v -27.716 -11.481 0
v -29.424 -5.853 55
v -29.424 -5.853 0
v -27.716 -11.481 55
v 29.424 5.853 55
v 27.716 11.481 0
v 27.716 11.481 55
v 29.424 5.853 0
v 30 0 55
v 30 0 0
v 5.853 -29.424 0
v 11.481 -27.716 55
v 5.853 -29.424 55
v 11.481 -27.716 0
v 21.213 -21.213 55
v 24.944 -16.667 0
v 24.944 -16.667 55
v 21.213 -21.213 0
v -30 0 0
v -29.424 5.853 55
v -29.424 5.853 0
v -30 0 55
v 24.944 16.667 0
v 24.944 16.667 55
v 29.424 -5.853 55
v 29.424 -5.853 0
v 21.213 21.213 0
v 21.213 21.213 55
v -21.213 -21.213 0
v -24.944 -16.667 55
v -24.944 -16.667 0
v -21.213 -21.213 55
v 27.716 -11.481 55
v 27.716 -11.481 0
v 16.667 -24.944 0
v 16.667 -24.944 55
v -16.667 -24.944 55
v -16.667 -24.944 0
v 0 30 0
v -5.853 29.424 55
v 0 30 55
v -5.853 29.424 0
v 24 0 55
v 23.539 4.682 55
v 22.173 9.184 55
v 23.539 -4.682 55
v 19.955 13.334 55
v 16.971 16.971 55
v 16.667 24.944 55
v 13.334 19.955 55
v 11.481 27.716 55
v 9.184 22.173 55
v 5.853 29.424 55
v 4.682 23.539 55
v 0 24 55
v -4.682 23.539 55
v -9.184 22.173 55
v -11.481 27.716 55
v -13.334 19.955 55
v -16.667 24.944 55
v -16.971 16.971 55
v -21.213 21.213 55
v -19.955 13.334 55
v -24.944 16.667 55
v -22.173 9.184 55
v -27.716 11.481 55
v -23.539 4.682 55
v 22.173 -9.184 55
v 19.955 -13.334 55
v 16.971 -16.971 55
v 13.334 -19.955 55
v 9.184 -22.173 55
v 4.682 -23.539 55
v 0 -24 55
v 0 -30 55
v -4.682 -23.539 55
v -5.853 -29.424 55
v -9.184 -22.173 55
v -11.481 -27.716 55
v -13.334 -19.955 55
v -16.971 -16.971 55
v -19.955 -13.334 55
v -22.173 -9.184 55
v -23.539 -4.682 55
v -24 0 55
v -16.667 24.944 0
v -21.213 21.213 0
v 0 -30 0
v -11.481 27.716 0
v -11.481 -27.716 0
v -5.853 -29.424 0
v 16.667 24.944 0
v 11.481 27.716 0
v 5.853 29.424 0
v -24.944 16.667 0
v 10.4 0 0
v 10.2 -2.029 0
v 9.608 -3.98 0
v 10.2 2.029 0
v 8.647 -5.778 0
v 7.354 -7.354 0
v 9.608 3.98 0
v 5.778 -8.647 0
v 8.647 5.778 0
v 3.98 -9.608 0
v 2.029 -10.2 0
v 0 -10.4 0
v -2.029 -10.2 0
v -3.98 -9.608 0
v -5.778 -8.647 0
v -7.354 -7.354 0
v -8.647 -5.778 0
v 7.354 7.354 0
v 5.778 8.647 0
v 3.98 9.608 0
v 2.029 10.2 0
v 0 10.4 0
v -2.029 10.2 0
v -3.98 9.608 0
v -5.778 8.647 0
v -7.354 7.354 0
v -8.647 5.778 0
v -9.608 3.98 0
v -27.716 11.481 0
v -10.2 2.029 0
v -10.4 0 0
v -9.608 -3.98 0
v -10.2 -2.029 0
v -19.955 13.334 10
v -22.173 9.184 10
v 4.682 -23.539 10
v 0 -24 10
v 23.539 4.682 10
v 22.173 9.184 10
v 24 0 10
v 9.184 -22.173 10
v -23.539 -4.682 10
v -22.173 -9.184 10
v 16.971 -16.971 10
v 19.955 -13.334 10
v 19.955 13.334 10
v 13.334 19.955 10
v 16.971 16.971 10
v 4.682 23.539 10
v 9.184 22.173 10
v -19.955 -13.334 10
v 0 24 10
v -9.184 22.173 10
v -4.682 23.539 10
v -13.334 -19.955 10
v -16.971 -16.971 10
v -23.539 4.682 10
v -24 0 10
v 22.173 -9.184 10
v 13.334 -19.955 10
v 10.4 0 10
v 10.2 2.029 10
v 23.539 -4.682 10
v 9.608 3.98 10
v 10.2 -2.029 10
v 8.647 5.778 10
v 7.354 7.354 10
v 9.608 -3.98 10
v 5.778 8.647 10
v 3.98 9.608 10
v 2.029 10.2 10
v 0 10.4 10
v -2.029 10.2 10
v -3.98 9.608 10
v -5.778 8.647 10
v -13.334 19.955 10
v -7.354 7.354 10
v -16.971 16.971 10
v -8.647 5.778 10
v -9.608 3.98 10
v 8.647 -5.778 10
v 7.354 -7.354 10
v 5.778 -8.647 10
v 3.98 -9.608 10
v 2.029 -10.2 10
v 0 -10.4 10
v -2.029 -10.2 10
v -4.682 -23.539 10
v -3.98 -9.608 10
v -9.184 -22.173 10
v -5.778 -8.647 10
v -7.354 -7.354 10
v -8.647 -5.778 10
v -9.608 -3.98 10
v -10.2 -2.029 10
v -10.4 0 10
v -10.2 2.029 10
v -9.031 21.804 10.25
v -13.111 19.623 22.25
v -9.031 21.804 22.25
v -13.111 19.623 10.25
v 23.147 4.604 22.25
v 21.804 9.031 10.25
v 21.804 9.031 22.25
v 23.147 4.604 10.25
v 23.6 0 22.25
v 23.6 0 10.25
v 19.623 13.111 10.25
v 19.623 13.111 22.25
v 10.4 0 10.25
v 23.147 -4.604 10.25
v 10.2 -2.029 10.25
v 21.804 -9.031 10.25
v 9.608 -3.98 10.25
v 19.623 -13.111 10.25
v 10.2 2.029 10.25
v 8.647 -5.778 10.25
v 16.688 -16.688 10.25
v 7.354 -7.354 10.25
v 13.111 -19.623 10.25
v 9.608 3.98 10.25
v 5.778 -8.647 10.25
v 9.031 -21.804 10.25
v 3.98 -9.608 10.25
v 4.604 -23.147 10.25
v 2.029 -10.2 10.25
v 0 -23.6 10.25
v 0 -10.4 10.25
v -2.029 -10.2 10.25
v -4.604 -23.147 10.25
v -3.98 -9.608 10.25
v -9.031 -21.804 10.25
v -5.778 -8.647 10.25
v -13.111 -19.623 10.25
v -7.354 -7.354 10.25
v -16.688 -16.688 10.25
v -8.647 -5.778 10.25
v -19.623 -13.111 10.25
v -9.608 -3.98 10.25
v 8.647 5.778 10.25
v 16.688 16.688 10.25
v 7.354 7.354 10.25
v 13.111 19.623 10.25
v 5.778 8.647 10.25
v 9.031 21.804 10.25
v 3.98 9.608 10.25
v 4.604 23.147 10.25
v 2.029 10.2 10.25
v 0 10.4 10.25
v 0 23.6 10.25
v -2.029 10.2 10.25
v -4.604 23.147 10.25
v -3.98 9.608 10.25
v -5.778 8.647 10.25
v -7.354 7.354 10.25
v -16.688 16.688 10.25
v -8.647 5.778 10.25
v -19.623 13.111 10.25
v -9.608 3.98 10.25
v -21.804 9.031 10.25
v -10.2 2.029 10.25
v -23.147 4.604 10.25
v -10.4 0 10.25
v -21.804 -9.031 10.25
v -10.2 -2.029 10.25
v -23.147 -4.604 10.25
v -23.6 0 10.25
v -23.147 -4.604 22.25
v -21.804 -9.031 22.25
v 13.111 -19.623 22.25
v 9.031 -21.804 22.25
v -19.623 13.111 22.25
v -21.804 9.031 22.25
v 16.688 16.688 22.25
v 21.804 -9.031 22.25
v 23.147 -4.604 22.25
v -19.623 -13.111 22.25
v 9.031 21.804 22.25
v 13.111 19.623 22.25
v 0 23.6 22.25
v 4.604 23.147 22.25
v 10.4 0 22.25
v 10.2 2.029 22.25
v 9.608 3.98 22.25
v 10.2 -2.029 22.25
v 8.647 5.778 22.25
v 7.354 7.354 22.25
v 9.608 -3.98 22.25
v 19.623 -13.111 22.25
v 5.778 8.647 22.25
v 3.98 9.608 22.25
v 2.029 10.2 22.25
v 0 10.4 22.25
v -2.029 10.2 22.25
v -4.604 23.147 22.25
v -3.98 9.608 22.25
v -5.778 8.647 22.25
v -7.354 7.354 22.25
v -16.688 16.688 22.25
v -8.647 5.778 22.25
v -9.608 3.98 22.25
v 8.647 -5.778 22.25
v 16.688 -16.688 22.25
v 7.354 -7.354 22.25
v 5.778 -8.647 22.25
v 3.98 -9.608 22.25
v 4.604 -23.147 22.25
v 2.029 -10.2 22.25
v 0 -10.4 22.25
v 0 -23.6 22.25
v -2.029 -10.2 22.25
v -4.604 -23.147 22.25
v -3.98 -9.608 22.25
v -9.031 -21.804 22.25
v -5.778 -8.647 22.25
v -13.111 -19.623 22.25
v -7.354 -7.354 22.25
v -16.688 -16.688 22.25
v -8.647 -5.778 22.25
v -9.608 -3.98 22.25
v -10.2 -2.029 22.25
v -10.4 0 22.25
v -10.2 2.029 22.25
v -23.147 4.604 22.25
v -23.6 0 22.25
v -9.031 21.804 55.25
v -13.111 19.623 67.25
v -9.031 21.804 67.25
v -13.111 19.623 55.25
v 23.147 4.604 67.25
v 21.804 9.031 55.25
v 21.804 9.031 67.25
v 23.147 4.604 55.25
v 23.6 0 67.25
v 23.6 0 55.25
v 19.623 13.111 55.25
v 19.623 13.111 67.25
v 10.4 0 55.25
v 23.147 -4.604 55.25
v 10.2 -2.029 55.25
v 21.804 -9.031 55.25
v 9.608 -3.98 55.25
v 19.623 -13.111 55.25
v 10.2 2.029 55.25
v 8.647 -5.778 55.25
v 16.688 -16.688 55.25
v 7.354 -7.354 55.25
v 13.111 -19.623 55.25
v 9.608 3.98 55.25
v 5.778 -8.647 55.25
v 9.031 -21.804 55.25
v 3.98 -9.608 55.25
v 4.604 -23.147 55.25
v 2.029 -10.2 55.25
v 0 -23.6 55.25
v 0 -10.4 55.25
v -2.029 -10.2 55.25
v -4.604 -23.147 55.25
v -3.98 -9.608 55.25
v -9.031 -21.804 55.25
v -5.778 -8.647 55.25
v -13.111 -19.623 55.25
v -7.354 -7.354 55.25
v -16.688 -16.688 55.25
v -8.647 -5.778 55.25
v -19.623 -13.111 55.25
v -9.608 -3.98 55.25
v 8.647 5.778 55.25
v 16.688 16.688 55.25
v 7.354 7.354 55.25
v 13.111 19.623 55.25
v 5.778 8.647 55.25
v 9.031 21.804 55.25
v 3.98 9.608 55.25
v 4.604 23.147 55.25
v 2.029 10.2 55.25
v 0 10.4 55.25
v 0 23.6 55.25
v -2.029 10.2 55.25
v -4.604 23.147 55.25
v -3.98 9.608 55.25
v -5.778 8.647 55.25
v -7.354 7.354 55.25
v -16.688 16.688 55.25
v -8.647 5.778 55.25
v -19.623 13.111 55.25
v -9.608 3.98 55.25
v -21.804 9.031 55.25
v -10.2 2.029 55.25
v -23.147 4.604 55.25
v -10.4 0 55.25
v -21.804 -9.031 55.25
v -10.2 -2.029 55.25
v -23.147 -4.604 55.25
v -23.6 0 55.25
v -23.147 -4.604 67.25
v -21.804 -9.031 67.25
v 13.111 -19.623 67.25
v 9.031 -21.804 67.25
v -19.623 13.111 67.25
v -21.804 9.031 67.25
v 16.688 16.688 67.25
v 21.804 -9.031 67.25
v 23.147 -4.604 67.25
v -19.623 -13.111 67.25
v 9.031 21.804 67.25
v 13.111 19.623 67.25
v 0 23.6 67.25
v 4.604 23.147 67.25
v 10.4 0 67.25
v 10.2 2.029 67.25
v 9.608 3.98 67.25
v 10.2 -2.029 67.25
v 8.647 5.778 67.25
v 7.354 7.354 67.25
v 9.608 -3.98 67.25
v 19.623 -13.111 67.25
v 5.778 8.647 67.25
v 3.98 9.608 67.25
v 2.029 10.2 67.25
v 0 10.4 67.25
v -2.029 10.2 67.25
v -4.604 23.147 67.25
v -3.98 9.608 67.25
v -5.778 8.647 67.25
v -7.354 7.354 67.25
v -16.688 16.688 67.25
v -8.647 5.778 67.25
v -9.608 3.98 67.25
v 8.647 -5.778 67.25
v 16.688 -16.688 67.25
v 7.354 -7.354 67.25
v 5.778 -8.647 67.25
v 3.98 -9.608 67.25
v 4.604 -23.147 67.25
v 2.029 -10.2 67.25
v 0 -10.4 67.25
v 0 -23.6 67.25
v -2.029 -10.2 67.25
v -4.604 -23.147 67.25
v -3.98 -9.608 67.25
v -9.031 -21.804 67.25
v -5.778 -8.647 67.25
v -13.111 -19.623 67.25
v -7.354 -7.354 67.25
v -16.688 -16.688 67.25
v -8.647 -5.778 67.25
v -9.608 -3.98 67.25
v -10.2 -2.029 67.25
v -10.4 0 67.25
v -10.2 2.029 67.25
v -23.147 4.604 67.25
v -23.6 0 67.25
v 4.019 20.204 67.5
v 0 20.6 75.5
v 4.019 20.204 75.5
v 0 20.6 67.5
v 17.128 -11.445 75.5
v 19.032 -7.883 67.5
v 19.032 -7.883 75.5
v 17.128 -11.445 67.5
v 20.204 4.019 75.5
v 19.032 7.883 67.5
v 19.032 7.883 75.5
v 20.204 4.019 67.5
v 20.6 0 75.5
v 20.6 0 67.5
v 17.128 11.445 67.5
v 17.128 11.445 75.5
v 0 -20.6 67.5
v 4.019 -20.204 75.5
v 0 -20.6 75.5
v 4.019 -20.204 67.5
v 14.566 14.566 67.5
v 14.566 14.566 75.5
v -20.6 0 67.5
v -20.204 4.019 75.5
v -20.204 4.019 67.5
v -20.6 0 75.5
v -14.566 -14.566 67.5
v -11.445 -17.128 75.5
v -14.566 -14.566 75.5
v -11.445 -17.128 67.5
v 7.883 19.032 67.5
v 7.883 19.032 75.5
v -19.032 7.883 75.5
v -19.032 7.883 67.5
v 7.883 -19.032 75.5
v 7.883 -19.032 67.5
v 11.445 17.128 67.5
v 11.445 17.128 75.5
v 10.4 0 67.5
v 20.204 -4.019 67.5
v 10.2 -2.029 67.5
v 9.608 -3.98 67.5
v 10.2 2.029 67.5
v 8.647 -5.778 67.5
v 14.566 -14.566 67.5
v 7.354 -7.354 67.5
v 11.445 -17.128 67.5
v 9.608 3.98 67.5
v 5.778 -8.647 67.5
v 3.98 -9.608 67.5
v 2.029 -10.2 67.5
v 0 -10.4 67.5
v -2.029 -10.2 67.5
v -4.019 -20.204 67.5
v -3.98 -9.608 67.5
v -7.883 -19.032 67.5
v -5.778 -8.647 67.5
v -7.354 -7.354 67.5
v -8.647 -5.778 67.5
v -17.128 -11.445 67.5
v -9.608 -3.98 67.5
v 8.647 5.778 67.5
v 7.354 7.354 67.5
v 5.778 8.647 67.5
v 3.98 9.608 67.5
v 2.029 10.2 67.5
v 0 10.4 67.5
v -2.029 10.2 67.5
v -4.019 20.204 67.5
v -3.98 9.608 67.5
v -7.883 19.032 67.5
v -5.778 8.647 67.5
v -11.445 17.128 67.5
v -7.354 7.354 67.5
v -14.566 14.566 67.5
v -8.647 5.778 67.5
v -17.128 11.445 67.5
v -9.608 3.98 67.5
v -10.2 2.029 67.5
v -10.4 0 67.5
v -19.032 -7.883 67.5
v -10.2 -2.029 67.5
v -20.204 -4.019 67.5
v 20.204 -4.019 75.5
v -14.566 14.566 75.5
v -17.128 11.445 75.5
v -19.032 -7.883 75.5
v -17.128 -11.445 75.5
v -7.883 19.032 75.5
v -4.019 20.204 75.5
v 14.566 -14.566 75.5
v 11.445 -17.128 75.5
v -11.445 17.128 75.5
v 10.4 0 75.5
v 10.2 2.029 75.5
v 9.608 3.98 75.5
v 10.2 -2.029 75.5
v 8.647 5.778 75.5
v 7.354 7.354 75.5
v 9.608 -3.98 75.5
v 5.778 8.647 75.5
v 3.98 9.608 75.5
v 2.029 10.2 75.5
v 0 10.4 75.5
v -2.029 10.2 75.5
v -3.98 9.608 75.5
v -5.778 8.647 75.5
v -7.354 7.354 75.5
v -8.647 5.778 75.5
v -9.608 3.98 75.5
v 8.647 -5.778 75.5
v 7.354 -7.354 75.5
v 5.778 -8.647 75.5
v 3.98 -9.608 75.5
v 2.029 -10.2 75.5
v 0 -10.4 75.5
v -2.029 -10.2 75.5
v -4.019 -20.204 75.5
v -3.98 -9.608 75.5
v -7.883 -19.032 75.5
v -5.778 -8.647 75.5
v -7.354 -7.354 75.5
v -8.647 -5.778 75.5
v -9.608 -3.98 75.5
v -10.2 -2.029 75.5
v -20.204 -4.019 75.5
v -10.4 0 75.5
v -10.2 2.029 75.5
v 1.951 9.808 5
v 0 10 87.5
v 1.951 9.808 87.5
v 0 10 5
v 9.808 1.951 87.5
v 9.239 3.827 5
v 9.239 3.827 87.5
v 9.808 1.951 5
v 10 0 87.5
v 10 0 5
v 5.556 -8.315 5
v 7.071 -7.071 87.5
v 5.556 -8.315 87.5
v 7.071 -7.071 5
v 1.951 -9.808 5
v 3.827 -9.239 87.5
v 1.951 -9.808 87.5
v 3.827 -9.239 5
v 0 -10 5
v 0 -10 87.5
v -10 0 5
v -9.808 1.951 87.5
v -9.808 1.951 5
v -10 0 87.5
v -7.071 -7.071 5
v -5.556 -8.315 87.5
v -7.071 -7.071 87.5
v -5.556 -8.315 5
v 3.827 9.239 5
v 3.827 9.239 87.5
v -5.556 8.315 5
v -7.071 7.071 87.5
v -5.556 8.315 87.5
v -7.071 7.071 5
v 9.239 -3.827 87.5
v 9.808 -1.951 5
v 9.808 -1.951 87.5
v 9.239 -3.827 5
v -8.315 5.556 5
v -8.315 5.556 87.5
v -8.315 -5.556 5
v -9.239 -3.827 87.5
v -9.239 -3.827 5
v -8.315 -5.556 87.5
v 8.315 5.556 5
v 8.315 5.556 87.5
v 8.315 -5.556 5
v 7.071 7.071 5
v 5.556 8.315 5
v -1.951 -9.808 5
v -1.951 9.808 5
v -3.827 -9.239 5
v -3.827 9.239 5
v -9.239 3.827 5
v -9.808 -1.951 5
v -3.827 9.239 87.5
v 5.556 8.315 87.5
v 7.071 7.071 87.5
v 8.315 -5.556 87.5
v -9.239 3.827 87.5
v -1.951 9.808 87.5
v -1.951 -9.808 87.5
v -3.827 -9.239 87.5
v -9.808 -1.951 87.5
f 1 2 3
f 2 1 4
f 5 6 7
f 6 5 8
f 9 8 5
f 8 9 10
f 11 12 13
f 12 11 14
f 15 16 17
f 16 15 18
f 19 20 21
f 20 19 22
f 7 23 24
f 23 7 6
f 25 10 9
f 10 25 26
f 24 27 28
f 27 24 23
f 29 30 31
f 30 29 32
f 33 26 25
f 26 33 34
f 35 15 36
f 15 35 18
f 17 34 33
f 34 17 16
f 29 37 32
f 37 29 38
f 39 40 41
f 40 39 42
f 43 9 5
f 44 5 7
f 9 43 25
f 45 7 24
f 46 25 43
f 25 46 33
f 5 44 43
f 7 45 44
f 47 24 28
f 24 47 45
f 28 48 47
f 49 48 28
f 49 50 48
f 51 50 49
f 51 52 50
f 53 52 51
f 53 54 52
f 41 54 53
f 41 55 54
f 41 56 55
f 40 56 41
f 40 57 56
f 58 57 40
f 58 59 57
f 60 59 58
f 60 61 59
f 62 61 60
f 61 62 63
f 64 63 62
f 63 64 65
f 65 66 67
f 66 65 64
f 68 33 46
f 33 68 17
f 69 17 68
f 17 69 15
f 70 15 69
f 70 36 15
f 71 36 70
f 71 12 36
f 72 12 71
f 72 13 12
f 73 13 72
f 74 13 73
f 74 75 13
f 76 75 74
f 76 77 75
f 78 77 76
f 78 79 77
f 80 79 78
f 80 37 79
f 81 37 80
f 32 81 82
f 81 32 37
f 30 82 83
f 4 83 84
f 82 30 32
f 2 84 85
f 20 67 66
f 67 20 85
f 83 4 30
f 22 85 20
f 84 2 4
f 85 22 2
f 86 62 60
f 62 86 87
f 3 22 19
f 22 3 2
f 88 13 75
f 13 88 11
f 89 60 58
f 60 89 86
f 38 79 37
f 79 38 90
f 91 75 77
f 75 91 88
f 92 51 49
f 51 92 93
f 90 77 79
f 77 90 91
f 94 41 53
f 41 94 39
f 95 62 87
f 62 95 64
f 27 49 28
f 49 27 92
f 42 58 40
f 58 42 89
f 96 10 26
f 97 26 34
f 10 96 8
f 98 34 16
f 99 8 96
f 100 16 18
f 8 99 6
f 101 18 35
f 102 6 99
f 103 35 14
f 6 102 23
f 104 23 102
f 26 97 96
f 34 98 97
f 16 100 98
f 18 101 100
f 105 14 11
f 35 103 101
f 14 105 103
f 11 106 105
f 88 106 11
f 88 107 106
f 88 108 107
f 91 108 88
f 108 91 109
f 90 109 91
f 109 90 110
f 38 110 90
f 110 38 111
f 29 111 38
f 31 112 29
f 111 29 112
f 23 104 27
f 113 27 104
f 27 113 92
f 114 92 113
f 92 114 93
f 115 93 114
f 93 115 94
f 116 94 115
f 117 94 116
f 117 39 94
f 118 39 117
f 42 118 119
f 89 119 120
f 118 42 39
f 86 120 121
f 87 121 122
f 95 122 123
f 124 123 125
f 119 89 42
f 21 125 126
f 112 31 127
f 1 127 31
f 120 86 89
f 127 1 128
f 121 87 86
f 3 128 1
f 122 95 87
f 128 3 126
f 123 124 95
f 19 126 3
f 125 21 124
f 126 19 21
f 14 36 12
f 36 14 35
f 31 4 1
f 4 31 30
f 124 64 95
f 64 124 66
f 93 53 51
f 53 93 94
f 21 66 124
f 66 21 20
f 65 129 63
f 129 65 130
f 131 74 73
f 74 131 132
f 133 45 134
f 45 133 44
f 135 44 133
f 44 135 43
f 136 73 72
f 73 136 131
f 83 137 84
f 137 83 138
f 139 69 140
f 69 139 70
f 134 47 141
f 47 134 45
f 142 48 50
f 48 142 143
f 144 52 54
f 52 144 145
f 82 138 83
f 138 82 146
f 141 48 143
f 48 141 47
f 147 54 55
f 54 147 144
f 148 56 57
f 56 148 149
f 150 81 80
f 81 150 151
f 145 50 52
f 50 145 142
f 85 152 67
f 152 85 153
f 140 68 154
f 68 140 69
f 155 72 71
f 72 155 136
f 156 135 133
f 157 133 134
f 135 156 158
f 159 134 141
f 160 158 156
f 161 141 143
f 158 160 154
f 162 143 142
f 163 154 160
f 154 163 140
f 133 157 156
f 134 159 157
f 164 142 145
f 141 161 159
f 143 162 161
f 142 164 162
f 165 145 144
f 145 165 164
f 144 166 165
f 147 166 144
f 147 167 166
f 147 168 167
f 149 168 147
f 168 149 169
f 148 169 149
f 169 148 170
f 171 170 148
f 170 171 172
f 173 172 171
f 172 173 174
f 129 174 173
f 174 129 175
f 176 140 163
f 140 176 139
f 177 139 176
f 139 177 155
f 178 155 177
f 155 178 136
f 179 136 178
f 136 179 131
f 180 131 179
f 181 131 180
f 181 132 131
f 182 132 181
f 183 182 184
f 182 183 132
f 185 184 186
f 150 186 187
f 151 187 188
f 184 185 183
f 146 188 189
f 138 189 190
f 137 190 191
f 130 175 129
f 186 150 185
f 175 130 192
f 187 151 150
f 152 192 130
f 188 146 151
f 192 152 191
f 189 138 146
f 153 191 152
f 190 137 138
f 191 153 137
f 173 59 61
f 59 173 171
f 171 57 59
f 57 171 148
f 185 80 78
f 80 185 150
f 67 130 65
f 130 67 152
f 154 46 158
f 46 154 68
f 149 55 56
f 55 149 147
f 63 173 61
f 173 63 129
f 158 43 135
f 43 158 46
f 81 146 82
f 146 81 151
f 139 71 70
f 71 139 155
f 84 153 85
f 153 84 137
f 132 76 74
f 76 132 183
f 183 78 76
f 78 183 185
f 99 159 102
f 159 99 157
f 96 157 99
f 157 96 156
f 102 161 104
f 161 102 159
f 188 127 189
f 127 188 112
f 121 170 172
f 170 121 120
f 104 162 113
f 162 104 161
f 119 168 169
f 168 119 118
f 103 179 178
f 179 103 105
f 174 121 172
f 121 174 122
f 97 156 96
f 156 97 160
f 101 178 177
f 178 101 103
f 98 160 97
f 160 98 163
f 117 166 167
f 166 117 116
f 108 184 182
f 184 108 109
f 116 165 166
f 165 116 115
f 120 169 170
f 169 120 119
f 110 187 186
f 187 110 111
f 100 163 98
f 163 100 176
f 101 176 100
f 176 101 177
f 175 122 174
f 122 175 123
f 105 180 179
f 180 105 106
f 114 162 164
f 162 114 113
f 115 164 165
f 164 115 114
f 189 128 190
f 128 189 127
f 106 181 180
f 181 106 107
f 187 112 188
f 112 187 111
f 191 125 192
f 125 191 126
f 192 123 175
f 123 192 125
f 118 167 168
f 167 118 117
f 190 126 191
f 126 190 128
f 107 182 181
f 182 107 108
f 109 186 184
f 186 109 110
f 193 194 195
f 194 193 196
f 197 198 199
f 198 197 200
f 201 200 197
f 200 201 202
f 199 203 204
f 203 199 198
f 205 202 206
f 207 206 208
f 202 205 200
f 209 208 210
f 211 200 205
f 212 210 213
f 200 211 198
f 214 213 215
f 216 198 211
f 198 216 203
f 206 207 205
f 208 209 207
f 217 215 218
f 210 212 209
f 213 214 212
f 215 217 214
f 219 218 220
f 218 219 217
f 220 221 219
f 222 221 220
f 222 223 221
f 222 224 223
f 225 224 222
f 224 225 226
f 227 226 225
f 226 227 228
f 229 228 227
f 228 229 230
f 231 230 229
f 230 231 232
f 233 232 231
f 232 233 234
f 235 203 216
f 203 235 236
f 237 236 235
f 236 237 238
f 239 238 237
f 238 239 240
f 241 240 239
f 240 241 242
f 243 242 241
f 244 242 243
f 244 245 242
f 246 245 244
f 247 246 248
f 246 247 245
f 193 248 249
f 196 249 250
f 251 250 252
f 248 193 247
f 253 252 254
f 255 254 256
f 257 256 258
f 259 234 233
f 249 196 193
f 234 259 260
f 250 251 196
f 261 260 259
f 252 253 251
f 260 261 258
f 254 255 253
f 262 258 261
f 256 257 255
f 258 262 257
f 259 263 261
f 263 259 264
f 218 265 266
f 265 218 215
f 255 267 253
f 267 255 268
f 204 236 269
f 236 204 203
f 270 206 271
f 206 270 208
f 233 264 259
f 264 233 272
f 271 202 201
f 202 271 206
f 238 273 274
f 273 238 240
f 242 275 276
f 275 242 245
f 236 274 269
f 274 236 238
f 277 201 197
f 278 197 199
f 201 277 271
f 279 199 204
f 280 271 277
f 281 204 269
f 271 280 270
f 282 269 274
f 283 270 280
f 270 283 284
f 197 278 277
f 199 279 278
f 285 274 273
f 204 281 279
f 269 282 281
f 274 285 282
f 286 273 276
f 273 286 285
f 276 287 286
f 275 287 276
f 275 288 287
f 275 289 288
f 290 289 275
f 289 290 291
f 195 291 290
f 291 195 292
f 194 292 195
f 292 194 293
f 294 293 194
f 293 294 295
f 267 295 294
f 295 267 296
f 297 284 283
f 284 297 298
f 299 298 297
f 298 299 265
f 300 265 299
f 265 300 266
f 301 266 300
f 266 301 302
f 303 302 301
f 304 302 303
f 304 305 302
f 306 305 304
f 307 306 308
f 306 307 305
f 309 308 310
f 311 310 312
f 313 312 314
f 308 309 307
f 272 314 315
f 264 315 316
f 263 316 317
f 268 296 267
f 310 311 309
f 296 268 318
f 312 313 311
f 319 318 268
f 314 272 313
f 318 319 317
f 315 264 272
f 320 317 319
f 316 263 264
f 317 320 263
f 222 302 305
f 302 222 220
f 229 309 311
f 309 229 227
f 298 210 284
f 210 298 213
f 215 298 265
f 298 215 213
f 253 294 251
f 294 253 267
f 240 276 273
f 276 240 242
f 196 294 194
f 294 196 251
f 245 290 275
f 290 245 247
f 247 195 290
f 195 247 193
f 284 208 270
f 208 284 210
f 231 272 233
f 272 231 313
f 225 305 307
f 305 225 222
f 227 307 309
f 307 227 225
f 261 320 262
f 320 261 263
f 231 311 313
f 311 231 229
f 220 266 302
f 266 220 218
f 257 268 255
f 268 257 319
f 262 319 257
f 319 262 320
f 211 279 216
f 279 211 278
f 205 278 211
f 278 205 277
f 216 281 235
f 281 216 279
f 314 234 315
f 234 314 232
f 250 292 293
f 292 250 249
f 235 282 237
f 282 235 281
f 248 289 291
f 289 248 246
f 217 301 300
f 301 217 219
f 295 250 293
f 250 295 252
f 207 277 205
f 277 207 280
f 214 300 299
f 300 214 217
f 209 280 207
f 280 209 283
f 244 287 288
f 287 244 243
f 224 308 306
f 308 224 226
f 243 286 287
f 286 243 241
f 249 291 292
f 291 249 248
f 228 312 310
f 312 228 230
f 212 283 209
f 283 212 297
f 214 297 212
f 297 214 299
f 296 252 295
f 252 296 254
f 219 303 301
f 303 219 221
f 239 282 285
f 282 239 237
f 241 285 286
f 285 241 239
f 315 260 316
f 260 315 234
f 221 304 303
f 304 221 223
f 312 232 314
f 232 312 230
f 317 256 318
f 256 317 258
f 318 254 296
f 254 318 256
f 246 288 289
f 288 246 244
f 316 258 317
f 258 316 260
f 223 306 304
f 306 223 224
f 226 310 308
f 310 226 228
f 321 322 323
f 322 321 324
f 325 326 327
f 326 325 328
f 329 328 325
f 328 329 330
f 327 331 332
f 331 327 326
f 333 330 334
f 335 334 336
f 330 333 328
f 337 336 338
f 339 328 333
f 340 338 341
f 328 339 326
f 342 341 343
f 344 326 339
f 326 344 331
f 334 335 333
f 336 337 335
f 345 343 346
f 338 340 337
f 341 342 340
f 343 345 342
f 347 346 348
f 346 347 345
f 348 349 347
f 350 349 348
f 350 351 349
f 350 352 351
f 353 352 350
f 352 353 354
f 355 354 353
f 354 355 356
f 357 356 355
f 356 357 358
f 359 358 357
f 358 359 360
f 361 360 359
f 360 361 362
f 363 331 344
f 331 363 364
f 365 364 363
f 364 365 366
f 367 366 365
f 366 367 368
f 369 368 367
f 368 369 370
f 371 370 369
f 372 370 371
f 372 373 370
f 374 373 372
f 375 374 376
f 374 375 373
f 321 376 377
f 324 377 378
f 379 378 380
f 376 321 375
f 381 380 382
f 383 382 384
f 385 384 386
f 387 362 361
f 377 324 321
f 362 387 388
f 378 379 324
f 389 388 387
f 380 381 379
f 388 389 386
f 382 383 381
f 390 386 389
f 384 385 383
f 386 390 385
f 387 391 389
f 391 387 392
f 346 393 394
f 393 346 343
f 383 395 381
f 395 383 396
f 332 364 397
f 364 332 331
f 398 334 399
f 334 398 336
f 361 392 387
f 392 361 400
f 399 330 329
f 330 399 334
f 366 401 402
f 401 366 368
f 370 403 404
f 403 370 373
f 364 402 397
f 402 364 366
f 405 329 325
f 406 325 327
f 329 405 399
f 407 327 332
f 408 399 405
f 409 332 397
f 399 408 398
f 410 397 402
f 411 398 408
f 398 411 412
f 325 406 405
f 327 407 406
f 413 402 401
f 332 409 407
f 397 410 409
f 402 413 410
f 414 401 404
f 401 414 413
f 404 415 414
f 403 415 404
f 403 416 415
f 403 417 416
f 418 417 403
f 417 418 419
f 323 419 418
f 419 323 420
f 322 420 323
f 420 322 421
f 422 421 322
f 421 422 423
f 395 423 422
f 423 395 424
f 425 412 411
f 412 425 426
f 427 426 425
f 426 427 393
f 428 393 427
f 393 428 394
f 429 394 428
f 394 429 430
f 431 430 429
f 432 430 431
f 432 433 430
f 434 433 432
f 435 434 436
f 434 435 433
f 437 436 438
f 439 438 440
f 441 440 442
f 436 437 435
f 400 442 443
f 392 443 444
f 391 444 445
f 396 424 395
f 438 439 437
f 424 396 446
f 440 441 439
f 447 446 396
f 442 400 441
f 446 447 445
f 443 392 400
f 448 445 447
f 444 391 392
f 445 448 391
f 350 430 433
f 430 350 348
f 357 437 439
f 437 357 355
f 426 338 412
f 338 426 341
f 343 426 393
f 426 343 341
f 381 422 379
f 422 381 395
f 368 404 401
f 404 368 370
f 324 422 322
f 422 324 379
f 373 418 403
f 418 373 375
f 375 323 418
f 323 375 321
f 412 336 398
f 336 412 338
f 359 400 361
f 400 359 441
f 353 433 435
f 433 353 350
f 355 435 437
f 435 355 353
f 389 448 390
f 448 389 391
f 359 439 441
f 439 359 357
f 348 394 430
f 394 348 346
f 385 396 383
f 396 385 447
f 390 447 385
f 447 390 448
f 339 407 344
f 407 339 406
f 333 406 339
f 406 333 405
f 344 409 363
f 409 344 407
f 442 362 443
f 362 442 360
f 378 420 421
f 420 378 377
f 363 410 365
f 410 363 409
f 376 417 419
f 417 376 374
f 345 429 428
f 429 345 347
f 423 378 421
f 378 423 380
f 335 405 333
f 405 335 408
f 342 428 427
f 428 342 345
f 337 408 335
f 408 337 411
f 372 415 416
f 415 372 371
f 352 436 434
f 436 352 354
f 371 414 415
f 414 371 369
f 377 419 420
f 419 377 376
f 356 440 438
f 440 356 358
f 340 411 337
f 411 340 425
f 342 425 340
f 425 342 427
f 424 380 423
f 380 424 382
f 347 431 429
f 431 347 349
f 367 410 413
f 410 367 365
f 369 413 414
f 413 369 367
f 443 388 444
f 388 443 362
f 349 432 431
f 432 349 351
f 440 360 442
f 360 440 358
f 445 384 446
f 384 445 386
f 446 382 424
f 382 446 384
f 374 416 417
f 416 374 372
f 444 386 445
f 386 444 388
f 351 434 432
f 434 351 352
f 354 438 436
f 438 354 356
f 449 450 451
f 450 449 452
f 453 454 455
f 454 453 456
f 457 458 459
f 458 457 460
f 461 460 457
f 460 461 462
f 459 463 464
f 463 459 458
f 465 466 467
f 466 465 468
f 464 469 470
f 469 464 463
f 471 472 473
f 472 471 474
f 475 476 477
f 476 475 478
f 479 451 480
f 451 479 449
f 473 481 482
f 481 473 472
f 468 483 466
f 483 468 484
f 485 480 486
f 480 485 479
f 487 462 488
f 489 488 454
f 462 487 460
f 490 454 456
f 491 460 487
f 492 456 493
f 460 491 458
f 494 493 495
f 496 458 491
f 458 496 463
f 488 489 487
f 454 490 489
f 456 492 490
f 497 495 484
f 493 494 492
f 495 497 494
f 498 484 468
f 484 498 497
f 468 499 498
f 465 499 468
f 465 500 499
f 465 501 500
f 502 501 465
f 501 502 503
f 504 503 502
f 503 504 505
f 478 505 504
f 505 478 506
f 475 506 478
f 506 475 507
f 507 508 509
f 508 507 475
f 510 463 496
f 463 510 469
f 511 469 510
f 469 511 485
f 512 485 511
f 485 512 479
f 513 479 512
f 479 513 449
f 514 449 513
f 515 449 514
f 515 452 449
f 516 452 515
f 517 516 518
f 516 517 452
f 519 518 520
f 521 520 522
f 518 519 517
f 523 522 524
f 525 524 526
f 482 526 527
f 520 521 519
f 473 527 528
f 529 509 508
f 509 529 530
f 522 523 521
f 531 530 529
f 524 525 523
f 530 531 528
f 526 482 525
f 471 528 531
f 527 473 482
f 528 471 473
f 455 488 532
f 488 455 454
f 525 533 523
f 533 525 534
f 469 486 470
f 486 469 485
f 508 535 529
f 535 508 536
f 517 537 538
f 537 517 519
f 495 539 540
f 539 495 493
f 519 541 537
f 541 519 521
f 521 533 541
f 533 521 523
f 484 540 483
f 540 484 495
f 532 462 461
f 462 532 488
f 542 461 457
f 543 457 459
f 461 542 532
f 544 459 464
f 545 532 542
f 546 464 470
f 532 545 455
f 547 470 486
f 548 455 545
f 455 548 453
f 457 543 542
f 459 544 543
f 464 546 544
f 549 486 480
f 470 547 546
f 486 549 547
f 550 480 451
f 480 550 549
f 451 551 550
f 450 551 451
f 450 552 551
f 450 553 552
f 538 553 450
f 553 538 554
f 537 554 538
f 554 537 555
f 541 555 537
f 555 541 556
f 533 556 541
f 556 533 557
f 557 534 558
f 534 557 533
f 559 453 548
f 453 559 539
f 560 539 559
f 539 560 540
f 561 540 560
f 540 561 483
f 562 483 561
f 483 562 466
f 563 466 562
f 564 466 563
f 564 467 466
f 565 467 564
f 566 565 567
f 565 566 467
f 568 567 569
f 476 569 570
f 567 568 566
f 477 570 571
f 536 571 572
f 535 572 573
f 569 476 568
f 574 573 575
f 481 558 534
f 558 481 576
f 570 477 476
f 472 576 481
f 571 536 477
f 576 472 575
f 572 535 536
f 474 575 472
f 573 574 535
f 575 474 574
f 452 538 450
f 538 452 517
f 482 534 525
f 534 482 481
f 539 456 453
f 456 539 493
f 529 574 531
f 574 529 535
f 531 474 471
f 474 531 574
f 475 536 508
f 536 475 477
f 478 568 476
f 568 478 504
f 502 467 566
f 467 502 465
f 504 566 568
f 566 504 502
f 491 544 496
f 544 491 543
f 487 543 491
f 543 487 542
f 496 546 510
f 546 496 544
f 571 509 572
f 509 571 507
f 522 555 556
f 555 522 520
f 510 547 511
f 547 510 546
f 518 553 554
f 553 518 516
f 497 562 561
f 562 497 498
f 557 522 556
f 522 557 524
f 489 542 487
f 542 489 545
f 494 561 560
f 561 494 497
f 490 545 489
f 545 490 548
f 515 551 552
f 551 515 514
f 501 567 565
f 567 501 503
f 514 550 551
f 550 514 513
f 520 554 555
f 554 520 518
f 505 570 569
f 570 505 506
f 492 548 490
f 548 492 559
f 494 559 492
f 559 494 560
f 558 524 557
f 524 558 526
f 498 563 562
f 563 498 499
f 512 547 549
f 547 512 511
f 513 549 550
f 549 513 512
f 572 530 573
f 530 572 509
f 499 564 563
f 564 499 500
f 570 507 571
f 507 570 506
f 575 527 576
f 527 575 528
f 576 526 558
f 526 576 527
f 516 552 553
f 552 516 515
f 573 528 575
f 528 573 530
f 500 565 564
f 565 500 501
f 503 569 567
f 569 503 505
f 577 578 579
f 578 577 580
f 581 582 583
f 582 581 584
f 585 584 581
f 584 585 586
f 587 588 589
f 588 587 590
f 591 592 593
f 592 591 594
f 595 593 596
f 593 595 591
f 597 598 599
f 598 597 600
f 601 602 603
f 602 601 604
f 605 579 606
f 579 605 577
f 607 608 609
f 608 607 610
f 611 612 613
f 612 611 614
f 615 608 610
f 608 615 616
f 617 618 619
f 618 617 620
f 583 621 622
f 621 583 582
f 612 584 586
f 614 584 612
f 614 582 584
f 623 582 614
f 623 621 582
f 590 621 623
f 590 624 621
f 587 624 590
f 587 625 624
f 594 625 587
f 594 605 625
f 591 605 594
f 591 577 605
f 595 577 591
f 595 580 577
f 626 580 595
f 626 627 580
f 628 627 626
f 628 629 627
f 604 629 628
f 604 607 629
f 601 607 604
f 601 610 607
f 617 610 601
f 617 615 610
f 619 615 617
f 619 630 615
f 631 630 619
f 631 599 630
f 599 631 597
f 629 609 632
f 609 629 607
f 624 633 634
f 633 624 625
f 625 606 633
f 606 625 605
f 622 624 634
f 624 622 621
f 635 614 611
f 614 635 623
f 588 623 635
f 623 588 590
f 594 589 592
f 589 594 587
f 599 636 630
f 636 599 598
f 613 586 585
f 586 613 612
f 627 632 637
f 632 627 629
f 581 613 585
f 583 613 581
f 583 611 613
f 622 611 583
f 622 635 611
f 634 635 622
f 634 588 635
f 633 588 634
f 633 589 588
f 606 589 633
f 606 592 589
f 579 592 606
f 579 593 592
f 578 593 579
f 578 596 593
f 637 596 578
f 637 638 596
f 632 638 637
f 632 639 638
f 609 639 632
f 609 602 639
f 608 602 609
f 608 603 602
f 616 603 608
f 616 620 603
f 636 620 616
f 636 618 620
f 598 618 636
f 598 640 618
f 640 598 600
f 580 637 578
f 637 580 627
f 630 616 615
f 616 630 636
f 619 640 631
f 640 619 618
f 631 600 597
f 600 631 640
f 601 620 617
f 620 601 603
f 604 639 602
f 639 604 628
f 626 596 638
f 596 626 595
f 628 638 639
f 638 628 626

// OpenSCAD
$fn = 32;

// ------------------------------------------------------------------------
// Bearing housing: housing d60, two bearings and a shaft
// Every part is its own module, assembly() places them once.
// ------------------------------------------------------------------------

// --- part 1 ---
module housing() {
  difference() {
    cylinder(h = 55, d = 60);
    translate([0, 0, 10]) cylinder(h = 46, d = 48);
    translate([0, 0, -1]) cylinder(h = 12, d = 20.8);
  }
}

// --- part 2 ---
module bearing_lower() {
  difference() {
      translate([0, 0, 0]) cylinder(h = 12, d = 47.2);
      translate([0, 0, -1]) cylinder(h = 14, d = 20.8);
    }
}

// --- part 3 ---
module bearing_upper() {
  difference() {
      translate([0, 0, 0]) cylinder(h = 12, d = 47.2);
      translate([0, 0, -1]) cylinder(h = 14, d = 20.8);
    }
}

// --- part 4 ---
module spacer() {
  difference() {
      translate([0, 0, 0]) cylinder(h = 8, d = 41.2);
      translate([0, 0, -1]) cylinder(h = 10, d = 20.8);
    }
}

// --- part 5 ---
module shaft() {
  translate([0, 0, -41.25]) cylinder(h = 82.5, d = 20);
}

// --- assembly ---
module assembly() {
  translate([0, 0, 0]) rotate([0, 0, 0]) housing();
  translate([0, 0, 10.25]) rotate([0, 0, 0]) bearing_lower();
  translate([0, 0, 55.25]) rotate([0, 0, 0]) bearing_upper();
  translate([0, 0, 67.5]) rotate([0, 0, 0]) spacer();
  translate([0, 0, 46.25]) rotate([0, 0, 0]) shaft();
}

assembly();
